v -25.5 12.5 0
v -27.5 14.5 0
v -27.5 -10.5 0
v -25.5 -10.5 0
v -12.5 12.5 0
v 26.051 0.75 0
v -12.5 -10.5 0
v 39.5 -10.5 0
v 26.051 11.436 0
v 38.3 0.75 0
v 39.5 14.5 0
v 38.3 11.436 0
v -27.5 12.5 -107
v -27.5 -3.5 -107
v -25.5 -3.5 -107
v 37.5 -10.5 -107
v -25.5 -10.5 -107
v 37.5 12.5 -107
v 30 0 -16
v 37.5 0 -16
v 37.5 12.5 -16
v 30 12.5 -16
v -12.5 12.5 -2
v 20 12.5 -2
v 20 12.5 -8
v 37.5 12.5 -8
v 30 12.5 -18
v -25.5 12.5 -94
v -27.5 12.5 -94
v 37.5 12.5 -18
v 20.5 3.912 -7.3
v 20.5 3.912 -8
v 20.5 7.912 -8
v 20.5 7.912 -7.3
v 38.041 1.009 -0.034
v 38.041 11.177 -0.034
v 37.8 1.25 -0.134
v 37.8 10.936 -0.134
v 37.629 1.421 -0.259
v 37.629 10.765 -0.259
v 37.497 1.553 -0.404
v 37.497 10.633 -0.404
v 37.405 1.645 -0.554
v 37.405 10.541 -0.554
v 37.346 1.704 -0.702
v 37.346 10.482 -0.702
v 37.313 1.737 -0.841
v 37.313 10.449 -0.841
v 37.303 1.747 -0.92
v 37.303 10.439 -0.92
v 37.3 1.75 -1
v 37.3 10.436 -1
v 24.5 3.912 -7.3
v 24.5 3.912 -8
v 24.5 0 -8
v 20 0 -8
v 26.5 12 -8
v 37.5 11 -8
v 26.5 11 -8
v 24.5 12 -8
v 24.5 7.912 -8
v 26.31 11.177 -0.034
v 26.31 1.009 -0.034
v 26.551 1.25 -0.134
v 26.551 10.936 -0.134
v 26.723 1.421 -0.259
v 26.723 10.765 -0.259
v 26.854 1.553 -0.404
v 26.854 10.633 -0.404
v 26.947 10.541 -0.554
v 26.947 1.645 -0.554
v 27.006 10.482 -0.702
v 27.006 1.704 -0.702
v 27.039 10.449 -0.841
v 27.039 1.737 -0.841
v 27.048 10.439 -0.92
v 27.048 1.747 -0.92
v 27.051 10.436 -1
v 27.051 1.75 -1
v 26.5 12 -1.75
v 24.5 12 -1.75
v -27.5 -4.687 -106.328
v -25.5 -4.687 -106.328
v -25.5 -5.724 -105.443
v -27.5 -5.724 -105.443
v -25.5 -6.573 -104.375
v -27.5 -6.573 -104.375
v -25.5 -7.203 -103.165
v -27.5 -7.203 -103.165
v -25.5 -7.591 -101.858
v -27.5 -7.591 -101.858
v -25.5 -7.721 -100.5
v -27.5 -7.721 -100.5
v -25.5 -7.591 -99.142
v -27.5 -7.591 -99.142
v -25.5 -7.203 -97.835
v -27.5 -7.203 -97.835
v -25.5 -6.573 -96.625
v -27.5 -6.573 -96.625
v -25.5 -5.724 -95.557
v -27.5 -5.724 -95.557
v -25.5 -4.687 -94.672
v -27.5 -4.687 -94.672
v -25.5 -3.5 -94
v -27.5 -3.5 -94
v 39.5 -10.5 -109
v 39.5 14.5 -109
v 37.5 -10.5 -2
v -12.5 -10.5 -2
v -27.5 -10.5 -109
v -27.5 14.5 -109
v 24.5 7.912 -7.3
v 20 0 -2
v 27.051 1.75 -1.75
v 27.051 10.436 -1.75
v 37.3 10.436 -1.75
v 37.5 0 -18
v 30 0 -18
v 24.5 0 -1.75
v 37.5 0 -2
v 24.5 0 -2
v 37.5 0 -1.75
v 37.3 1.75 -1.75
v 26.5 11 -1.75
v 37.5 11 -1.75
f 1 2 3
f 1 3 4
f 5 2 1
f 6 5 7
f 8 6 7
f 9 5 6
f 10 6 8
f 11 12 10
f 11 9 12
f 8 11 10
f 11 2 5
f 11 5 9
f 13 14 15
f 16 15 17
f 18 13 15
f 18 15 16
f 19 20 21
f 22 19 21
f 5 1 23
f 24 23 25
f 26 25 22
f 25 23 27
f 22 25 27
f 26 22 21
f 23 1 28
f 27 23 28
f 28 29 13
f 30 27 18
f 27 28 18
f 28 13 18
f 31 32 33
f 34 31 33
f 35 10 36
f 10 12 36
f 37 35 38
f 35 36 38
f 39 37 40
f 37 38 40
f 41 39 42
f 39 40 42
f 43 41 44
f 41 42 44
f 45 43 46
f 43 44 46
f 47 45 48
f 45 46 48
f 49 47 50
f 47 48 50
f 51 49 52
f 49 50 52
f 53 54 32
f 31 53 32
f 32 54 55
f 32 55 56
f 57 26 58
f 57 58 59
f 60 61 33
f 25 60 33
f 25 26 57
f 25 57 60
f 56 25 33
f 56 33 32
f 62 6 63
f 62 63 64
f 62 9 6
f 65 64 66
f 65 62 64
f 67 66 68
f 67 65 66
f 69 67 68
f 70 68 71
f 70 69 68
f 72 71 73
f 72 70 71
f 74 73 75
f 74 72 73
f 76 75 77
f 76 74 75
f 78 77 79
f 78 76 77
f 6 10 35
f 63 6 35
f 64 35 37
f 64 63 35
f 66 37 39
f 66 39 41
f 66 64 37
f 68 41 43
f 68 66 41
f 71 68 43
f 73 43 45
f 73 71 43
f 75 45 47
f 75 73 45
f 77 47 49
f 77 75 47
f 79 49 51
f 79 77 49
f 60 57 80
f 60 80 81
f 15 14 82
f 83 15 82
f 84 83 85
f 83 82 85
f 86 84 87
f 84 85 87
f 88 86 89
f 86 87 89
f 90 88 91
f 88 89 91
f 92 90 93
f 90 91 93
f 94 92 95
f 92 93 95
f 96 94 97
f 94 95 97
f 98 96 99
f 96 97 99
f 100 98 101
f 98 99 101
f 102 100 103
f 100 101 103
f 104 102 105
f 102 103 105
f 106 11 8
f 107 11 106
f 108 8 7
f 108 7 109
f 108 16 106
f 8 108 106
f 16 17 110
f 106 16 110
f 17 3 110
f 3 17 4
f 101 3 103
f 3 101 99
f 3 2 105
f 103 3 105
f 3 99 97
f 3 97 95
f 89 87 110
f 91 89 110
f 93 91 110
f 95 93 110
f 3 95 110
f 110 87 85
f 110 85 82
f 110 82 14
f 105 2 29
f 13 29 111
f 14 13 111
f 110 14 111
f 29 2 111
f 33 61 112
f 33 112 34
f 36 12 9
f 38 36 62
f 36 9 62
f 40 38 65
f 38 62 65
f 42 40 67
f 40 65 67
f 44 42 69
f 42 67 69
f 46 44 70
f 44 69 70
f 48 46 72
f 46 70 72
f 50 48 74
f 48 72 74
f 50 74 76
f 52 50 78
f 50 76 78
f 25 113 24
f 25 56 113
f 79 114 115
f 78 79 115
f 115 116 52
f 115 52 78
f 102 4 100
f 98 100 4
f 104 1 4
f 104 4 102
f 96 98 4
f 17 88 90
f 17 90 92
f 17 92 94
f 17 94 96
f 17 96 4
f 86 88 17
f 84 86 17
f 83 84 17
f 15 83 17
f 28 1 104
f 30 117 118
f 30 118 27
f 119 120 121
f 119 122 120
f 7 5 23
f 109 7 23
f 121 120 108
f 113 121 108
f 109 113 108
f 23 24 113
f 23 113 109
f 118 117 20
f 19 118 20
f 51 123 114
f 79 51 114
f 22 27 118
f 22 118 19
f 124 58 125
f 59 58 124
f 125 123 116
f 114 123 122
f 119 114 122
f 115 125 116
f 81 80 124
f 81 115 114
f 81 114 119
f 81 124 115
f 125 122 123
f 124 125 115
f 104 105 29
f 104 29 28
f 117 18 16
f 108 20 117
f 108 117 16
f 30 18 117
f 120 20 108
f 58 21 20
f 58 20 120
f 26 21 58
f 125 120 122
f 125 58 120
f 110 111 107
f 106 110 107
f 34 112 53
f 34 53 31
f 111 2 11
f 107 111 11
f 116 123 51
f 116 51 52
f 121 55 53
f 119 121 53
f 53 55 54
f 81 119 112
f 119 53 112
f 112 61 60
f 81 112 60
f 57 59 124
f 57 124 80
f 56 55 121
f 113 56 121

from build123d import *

# Parameters (mm, degrees)
BOSS_EXTRUDE1_DEPTH         = 29
SKETCH3_W                   = 4.5
SKETCH3_H                   = 21
CUT_EXTRUDE1_DEPTH          = 6
SKETCH6_R                   = 2.15
CUT_EXTRUDE2_DEPTH          = 41.509258201
CUT_EXTRUDE3_DEPTH          = 3.5
EXTRUDE_1_REACH             = 41.674
SKETCH_1_W                  = 19.5
SKETCH_1_H                  = 14.5
EXTRUDE_1_DIRECTION_2_REACH = 41.674
SKETCH_2_W                  = 4.5
SKETCH_2_H                  = 1
CUT_EXTRUDE_1_DEPTH         = 19.5
SKETCH_4_W                  = 4
SKETCH_4_H                  = 4
CUT_EXTRUDE_3_DEPTH         = 0.7
SKETCH_5_W                  = 2
SKETCH_5_H                  = 12
CUT_EXTRUDE_4_DEPTH         = 6.25
SKETCH_6_W                  = 11
SKETCH_6_H                  = 11
CUT_EXTRUDE_5_DEPTH         = 6.25
SKETCH_7_W                  = 10.248534494
SKETCH_7_H                  = 8.686096419
CUT_EXTRUDE_6_DEPTH         = 1.75
SKETCH_8_W                  = 2
SKETCH_8_H                  = 14.5
EXTRUDE_2_DEPTH             = 10
SKETCH_9_W                  = 2
SKETCH_9_H                  = 14.5
EXTRUDE_3_DEPTH             = 7.5
FILLET_1_R                  = 1
CUT_EXTRUDE_7_DEPTH         = 41.509258201
CUT_EXTRUDE_7_DEPTH_BACK    = 41.509258201
SKETCH_10_W                 = 65.54105611
SKETCH_10_H                 = 22.030016429
CUT_EXTRUDE_8_DEPTH         = 47.588625221
CUT_EXTRUDE_8_DEPTH_BACK    = 47.588625221
SKETCH_11_W                 = 33.086172565
SKETCH_11_H                 = 28.836254029
SKETCH_12_W                 = 67
SKETCH_12_H                 = 109
EXTRUDE_4_DEPTH             = 2
EXTRUDE_3_2_DEPTH           = 25
SKETCH_13_3_W               = 33
SKETCH_13_3_H               = 2
SKETCH_13_3_W_2             = 2
SKETCH_13_3_H_2             = 94
EXTRUDE_4_2_DEPTH           = 25
EXTRUDE_5_DEPTH             = 10.5
EXTRUDE_5_2_DEPTH           = 2


with BuildPart() as part:
    # Sketch2 → Boss-Extrude1 (new body)
    with BuildSketch(Plane(origin=(0, 0, 0), x_dir=(1, 0, 0), z_dir=(0, 1, 0))):
        with BuildLine():
            Line((0, 10), (0, 20))
            Line((0, 20), (8, 20))
            Line((8, 20), (8, 14.245191882))
            ThreePointArc((8, 14.245191882), (10.672752557, 14.316274399), (13, 13))
            Line((13, 13), (9.464466094, 9.464466094))
            Line((9.464466094, 9.464466094), (2.928932188, 2.928932188))
            ThreePointArc((2.928932188, 2.928932188), (0.761204675, 6.173165676), (0, 10))
        make_face()
    boss_extrude1 = extrude(amount=BOSS_EXTRUDE1_DEPTH)

    # Mirror1: Boss-Extrude1 across plane
    add(boss_extrude1.mirror(Plane(origin=(0, 0, 0), x_dir=(-0.707106781186546, 0, 0.707106781186549), z_dir=(0.707106781186549, 0, 0.707106781186546))))

    # Sketch3 → Cut-Extrude1 (cut)
    with BuildSketch(Plane(origin=(0, 0, -20), x_dir=(-1, 0, 0), z_dir=(0, 0, -1))):
        with Locations((-4, 14.5)):
            Rectangle(SKETCH3_W, SKETCH3_H)
    cut_extrude1 = extrude(amount=-CUT_EXTRUDE1_DEPTH, mode=Mode.SUBTRACT)

    # Mirror2: Cut-Extrude1 across plane
    add(cut_extrude1.mirror(Plane(origin=(0, 0, 0), x_dir=(-0.707106781186546, 0, 0.707106781186549), z_dir=(0.707106781186549, 0, 0.707106781186546))), mode=Mode.SUBTRACT)

    # Sketch6 → Cut-Extrude2 (cut, through all)
    with BuildSketch(Plane(origin=(0, 29, 0), x_dir=(1, 0, 0), z_dir=(0, 1, 0))):
        with Locations(Location((10, 10, 0), (0, 0, 270))):
            Circle(SKETCH6_R)
    extrude(amount=-CUT_EXTRUDE2_DEPTH, mode=Mode.SUBTRACT)

    # Sketch9 → Cut-Extrude3 (cut)
    with BuildSketch(Plane(origin=(0, 24, 0), x_dir=(1, 0, 0), z_dir=(0, 1, 0))):
        Polygon((8.939052358, 13.959510504), (13.429036683, 18.44949483), (18.429313529, 13.762345089), (13.959510504, 8.939052358), (11.060947642, 6.040489496), (7.101437138, 7.101437138), (6.040489496, 11.060947642), align=None)
    cut_extrude3 = extrude(amount=-CUT_EXTRUDE3_DEPTH, mode=Mode.SUBTRACT)

    # Mirror4: Cut-Extrude3 across plane
    add(cut_extrude3.mirror(Plane.ZX.offset(14.5)), mode=Mode.SUBTRACT)


with BuildPart() as body_2:

    # Бобышка-Вытянуть1: up to this face of the body (flat: up to its plane)
    extrude_1_end = Plane(part.part.faces().sort_by_distance((17.122595941, 14.5, -8))[0])
    # Эскиз1 → Бобышка-Вытянуть1 (new, up to the picked face)
    with BuildSketch(Plane(origin=(0, 0, -1.75), x_dir=(-1, 0, 0), z_dir=(0, 0, -1)), mode=Mode.PRIVATE) as extrude_1_sk1:
        with Locations((-29.75, 7.25)):
            Rectangle(SKETCH_1_W, SKETCH_1_H)
    extrude_1_tool1 = split(extrude(extrude_1_sk1.sketch, amount=EXTRUDE_1_REACH, mode=Mode.PRIVATE), bisect_by=extrude_1_end, keep=Keep.BOTH, mode=Mode.PRIVATE)
    add(extrude_1_tool1.solids().sort_by(Axis((29.75, 7.25, -1.75), (0, 0, -1)))[0])


    # Бобышка-Вытянуть1 direction 2: up to this face of the body (flat: up to its plane)
    extrude_1_direction_2_end = Plane(part.part.faces().sort_by_distance((15, 14.5, 0))[0])
    # Эскиз1 → Бобышка-Вытянуть1 direction 2 (add, up to the picked face)
    with BuildSketch(Plane(origin=(0, 0, -1.75), x_dir=(-1, 0, 0), z_dir=(0, 0, -1)), mode=Mode.PRIVATE) as extrude_1_direction_2_sk1:
        with Locations((-29.75, 7.25)):
            Rectangle(SKETCH_1_W, SKETCH_1_H)
    extrude_1_direction_2_tool1 = split(extrude(extrude_1_direction_2_sk1.sketch, amount=-EXTRUDE_1_DIRECTION_2_REACH, mode=Mode.PRIVATE), bisect_by=extrude_1_direction_2_end, keep=Keep.BOTH, mode=Mode.PRIVATE)
    add(extrude_1_direction_2_tool1.solids().sort_by(Axis((29.75, 7.25, -1.75), (0, 0, 1)))[0])

    # Эскиз2 → Вырез-Вытянуть1 (cut)
    with BuildSketch(Plane(origin=(39.5, 0, 0), x_dir=(0, 0, -1), z_dir=(1, 0, 0))):
        with Locations((4, 14)):
            Rectangle(SKETCH_2_W, SKETCH_2_H)
    extrude(amount=-CUT_EXTRUDE_1_DEPTH, mode=Mode.SUBTRACT)

    # Эскиз4 → Вырез-Вытянуть3 (cut)
    with BuildSketch(Plane(origin=(0, 0, -8), x_dir=(-1, 0, 0), z_dir=(0, 0, -1))):
        with Locations((-22.5, 5.912430948)):
            Rectangle(SKETCH_4_W, SKETCH_4_H)
    extrude(amount=-CUT_EXTRUDE_3_DEPTH, mode=Mode.SUBTRACT)

    # Эскиз5 → Вырез-Вытянуть4 (cut)
    with BuildSketch(Plane(origin=(0, 0, -8), x_dir=(-1, 0, 0), z_dir=(0, 0, -1))):
        with Locations((-25.5, 6)):
            Rectangle(SKETCH_5_W, SKETCH_5_H)
    extrude(amount=-CUT_EXTRUDE_4_DEPTH, mode=Mode.SUBTRACT)

    # Эскиз6 → Вырез-Вытянуть5 (cut)
    with BuildSketch(Plane(origin=(0, 0, -8), x_dir=(-1, 0, 0), z_dir=(0, 0, -1))):
        with Locations((-32, 5.5)):
            Rectangle(SKETCH_6_W, SKETCH_6_H)
    extrude(amount=-CUT_EXTRUDE_5_DEPTH, mode=Mode.SUBTRACT)

    # Эскиз7 → Вырез-Вытянуть6 (cut)
    with BuildSketch(Plane(origin=(0, 0, -1.75), x_dir=(-1, 0, 0), z_dir=(0, 0, -1))):
        with Locations((-32.175732753, 6.09304821)):
            Rectangle(SKETCH_7_W, SKETCH_7_H)
    extrude(amount=-CUT_EXTRUDE_6_DEPTH, mode=Mode.SUBTRACT)

    # Эскиз8 → Бобышка-Вытянуть2 (add)
    with BuildSketch(Plane(origin=(0, 0, -8), x_dir=(-1, 0, 0), z_dir=(0, 0, -1))):
        with Locations((-38.5, 7.25)):
            Rectangle(SKETCH_8_W, SKETCH_8_H)
    extrude(amount=EXTRUDE_2_DEPTH)

    # Эскиз9 → Extrude 3 (add)
    with BuildSketch(Plane.ZY.offset(-37.5)):
        with Locations((-17, 7.25)):
            Rectangle(SKETCH_9_W, SKETCH_9_H)
    extrude(amount=EXTRUDE_3_DEPTH)

    # Скругление1
    fillet_1_edges = [body_2.edges().sort_by_distance(p)[0] for p in [
        (32.175732753, 1.75, 0),
        (27.051465506, 6.09304821, 0),
        (32.175732753, 10.436096419, 0),
        (37.3, 6.09304821, 0),
    ]]
    fillet(fillet_1_edges, radius=FILLET_1_R)

    # Эскиз12 → Extrude 4 (add)
    with BuildSketch(Plane(origin=(0, 14.5, 0), x_dir=(1, 0, 0), z_dir=(0, 1, 0))):
        with Locations((6, 54.5)):
            Rectangle(SKETCH_12_W, SKETCH_12_H)
    extrude(amount=-EXTRUDE_4_DEPTH)

    # Эскиз13 → Extrude 3 2 (add)
    with BuildSketch(Plane(origin=(0, 14.5, 0), x_dir=(1, 0, 0), z_dir=(0, 1, 0))):
        Polygon((39.5, 18), (39.5, 109), (-27.5, 109), (-27.5, 107), (37.5, 107), (37.5, 18), align=None)
    extrude(amount=-EXTRUDE_3_2_DEPTH)

    # Эскиз13<3> → Extrude 4 2 (add)
    with BuildSketch(Plane(origin=(0, 14.5, 0), x_dir=(1, 0, 0), z_dir=(0, 1, 0))):
        with Locations((4, 1)):
            Rectangle(SKETCH_13_3_W, SKETCH_13_3_H)
        with Locations((-26.5, 47)):
            Rectangle(SKETCH_13_3_W_2, SKETCH_13_3_H_2)
    extrude(amount=-EXTRUDE_4_2_DEPTH)

    # Эскиз14 → Extrude 5 (add)
    with BuildSketch(Plane.XZ):
        Polygon((20.5, 0), (39.5, 0), (39.5, -18), (37.5, -18), (37.5, -2), (20.5, -2), align=None)
    extrude(amount=EXTRUDE_5_DEPTH)

    # Эскиз15 → Extrude 5 2 (add)
    with BuildSketch(Plane.ZY.offset(27.5)):
        with BuildLine():
            Line((-94, -10.5), (-107, -10.5))
            Line((-107, -10.5), (-107, -3.5))
            ThreePointArc((-107, -3.5), (-100.5, -7.721238279), (-94, -3.5))
            Line((-94, -3.5), (-94, -10.5))
        make_face()
    extrude(amount=-EXTRUDE_5_2_DEPTH)


with BuildPart() as part_1:
    add(part.part)

    # Эскиз10 → Вырез-Вытянуть7 (cut, two sides: drawn at the far end of the back side and taken through both)
    with BuildSketch(Plane(origin=(20, 0, 0), x_dir=(0, 0, -1), z_dir=(1, 0, 0)).offset(-CUT_EXTRUDE_7_DEPTH_BACK)):
        with Locations((-4.725182995, 25.515008214)):
            Rectangle(SKETCH_10_W, SKETCH_10_H)
    extrude(amount=CUT_EXTRUDE_7_DEPTH + CUT_EXTRUDE_7_DEPTH_BACK, mode=Mode.SUBTRACT)

    # Эскиз11 → Вырез-Вытянуть8 (cut, two sides: drawn at the far end of the back side and taken through both)
    with BuildSketch(Plane(origin=(0, 14.5, 0), x_dir=(1, 0, 0), z_dir=(0, 1, 0)).offset(-CUT_EXTRUDE_8_DEPTH_BACK)):
        with Locations((3.456913717, 14.418127015)):
            Rectangle(SKETCH_11_W, SKETCH_11_H)
    extrude(amount=CUT_EXTRUDE_8_DEPTH + CUT_EXTRUDE_8_DEPTH_BACK, mode=Mode.SUBTRACT)


solid = body_2.part
